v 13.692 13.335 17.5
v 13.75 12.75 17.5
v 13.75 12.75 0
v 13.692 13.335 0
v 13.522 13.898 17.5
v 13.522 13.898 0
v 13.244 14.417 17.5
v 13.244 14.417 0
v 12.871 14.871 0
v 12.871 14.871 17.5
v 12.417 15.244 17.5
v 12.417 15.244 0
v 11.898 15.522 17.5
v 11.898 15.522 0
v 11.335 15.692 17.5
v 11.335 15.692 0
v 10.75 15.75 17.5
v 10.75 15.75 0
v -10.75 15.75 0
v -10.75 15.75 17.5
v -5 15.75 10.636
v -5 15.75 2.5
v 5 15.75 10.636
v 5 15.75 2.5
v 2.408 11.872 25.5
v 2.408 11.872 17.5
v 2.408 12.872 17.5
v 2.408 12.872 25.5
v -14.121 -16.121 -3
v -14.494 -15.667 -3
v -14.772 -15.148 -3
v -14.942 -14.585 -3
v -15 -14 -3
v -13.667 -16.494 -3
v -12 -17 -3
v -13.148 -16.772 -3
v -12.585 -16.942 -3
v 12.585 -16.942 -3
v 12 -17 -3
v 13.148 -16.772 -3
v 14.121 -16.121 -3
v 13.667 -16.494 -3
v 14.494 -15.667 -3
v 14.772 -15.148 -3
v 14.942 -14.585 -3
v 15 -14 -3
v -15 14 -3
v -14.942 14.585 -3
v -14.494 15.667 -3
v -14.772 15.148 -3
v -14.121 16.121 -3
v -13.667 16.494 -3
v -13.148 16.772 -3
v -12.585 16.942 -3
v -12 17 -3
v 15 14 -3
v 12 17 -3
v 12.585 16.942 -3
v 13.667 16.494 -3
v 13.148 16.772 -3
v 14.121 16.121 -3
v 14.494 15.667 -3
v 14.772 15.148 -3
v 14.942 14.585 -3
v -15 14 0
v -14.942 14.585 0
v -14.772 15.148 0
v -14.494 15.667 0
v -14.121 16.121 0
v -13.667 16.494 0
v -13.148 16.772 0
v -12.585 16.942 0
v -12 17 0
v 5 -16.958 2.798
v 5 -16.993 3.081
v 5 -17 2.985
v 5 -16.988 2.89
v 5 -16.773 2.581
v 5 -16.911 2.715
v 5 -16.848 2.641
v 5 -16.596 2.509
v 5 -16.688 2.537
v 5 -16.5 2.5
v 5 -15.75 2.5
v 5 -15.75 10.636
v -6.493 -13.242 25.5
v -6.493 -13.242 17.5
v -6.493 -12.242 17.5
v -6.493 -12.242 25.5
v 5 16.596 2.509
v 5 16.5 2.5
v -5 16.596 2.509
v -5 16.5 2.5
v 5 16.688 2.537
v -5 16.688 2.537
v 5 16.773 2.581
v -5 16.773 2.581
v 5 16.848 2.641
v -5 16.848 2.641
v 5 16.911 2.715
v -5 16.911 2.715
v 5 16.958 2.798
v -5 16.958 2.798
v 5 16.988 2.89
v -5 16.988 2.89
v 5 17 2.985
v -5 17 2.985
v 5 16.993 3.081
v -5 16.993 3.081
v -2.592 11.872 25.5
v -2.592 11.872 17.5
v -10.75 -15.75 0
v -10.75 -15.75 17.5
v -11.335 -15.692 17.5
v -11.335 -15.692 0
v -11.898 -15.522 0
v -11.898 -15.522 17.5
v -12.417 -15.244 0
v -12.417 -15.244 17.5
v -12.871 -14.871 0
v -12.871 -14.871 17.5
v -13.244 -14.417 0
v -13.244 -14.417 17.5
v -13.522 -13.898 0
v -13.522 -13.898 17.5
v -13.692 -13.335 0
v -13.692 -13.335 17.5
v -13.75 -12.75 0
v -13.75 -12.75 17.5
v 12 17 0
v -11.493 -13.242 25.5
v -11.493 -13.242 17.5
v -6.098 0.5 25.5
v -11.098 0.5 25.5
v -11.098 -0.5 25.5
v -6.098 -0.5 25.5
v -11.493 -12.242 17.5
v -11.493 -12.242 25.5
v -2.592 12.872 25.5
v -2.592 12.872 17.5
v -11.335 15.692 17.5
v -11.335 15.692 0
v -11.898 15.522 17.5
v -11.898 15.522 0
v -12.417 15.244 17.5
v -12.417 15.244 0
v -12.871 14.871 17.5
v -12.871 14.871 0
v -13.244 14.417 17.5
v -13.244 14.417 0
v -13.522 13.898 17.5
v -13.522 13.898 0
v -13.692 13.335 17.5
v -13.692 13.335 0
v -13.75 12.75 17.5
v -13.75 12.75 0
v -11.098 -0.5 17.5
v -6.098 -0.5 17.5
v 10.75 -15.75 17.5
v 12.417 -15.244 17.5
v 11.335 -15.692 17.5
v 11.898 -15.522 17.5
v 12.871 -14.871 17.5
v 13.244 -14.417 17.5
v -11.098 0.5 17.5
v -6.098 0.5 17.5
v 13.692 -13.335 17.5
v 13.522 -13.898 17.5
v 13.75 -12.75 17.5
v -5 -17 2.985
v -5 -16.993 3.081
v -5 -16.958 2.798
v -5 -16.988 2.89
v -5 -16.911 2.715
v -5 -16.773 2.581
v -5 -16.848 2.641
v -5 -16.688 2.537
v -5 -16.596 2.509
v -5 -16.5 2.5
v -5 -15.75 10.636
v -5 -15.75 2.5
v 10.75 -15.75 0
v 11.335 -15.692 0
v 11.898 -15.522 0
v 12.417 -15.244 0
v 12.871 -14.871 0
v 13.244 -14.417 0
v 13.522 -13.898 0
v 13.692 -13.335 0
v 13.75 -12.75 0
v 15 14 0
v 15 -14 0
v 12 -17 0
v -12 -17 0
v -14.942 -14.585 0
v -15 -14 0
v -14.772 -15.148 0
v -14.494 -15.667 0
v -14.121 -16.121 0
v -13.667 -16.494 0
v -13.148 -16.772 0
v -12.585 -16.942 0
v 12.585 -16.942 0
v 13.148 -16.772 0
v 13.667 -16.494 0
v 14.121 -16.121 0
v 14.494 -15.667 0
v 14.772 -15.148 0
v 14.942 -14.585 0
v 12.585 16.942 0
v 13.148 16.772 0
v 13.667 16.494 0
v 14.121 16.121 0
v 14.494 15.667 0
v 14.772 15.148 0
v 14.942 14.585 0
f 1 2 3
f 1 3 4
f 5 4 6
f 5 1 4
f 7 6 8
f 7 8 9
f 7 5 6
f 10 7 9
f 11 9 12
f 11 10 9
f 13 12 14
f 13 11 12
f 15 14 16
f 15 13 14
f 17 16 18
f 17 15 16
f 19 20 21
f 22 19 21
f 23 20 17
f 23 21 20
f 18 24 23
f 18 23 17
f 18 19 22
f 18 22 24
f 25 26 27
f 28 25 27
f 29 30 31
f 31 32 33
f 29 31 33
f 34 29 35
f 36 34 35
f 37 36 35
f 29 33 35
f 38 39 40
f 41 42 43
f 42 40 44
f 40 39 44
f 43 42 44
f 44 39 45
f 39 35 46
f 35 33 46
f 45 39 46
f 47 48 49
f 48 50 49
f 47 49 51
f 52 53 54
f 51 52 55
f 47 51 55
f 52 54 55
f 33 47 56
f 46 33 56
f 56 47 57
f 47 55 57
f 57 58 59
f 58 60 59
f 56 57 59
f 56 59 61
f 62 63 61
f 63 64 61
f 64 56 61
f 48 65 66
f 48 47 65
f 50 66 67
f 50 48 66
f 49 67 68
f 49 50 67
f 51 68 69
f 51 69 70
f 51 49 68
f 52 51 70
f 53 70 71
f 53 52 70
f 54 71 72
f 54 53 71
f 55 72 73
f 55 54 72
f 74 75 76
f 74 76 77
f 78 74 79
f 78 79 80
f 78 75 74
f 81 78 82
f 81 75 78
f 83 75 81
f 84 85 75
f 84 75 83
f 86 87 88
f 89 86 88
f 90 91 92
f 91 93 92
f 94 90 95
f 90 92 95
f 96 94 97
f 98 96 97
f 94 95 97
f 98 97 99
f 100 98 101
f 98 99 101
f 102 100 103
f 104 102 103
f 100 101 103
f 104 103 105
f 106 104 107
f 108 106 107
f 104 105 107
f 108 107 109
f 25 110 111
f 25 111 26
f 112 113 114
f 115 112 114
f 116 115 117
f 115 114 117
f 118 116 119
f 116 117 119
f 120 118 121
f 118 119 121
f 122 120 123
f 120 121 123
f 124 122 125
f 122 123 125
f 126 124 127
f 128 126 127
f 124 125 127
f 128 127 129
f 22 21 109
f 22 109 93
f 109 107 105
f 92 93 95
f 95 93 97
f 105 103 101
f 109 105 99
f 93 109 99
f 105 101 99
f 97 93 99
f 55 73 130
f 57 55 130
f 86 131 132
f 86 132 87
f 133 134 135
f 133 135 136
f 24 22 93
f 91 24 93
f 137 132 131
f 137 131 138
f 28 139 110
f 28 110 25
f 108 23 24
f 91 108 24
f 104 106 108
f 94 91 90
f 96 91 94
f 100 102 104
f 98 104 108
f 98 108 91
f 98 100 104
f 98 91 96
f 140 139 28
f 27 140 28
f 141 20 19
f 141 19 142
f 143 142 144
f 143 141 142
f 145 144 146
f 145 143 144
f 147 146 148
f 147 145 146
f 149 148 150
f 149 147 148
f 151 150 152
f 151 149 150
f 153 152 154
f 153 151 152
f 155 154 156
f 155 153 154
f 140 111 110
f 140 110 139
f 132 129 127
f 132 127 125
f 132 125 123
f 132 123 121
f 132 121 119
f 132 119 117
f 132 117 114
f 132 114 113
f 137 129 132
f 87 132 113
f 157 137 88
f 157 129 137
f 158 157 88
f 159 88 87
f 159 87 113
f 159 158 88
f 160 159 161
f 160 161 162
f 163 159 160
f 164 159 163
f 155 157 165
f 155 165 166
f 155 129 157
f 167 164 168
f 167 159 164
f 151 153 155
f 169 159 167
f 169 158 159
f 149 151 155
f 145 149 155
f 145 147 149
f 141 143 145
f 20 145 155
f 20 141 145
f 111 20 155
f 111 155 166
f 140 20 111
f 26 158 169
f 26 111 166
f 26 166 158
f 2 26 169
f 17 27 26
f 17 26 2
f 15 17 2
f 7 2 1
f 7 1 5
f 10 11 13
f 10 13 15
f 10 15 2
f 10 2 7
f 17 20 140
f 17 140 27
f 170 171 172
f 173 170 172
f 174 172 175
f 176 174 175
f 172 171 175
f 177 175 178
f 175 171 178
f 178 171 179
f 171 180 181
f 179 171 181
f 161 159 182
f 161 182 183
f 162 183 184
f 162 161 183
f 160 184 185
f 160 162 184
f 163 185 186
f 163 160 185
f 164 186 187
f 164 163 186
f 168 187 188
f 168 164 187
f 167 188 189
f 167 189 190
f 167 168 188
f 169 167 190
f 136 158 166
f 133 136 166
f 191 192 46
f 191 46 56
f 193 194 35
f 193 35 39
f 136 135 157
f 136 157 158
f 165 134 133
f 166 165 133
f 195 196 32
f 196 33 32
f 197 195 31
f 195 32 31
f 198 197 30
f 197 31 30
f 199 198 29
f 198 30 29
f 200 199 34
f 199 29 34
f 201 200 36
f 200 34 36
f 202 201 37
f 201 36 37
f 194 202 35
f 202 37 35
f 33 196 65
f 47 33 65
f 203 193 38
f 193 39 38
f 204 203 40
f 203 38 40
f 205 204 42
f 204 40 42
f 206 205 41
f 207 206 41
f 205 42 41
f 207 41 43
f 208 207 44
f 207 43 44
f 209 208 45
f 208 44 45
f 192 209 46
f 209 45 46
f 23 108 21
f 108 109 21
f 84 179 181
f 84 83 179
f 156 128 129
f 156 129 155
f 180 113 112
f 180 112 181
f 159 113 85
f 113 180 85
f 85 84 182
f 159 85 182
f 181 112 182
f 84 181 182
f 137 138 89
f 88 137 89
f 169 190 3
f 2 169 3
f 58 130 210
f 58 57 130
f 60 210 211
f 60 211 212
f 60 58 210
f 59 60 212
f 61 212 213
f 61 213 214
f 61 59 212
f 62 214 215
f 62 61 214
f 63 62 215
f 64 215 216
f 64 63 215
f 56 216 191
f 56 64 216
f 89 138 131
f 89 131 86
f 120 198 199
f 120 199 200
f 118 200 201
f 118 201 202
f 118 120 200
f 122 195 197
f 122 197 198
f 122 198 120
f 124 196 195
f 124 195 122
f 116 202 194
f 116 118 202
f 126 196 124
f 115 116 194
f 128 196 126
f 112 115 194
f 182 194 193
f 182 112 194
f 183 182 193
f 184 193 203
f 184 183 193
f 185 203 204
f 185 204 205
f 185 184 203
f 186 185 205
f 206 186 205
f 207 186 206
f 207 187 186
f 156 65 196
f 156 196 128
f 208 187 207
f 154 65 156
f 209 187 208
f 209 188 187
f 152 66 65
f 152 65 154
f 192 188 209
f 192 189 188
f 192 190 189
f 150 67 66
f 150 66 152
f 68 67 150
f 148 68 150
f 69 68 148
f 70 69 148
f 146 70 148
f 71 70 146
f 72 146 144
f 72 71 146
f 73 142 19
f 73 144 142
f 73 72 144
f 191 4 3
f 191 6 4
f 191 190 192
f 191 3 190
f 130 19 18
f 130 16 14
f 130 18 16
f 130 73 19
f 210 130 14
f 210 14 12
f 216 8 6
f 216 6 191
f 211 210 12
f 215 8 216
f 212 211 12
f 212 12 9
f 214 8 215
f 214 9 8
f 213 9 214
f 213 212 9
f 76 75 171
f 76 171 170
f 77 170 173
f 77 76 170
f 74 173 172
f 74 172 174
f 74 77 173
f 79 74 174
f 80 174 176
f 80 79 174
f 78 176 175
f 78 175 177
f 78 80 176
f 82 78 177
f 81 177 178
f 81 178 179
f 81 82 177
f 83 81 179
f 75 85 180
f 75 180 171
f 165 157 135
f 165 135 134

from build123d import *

# Parameters (mm, degrees)
SKETCH1_W           = 30
SKETCH1_H           = 34
BOSS_EXTRUDE1_DEPTH = 3
SKETCH3_W           = 27.5
SKETCH3_H           = 31.5
BOSS_EXTRUDE2_DEPTH = 25.5
FILLET1_R           = 3
BOSS_EXTRUDE3_DEPTH = 5
SKETCH5_OUTSIDE_W   = 42.712
SKETCH5_OUTSIDE_H   = 46.712
SKETCH5_OUTSIDE_W_2 = 5
SKETCH5_OUTSIDE_H_2 = 1
CUT_EXTRUDE1_DEPTH  = 8


with BuildPart() as part:
    # Sketch1 → Boss-Extrude1 (new body)
    with BuildSketch(Plane.XY):
        Rectangle(SKETCH1_W, SKETCH1_H)
    extrude(amount=-BOSS_EXTRUDE1_DEPTH)

    # Sketch3 → Boss-Extrude2 (add)
    with BuildSketch(Plane.XY):
        Rectangle(SKETCH3_W, SKETCH3_H)
    extrude(amount=BOSS_EXTRUDE2_DEPTH)

    # Fillet1
    fillet1_edges = [part.edges().sort_by_distance(p)[0] for p in [
        (13.75, -15.75, 12.75),
        (13.75, 15.75, 12.75),
        (-13.75, 15.75, 12.75),
        (-13.75, -15.75, 12.75),
        (15, -17, -1.5),
        (-15, -17, -1.5),
        (-15, 17, -1.5),
        (15, 17, -1.5),
    ]]
    fillet(fillet1_edges, radius=FILLET1_R)

    # Sketch4 → Boss-Extrude3 (add, symmetric)
    with BuildSketch(Plane(origin=(0, 0, 0), x_dir=(0, 0, -1), z_dir=(1, 0, 0))):
        with BuildLine():
            Line((-2.5, 15.75), (-2.5, 16.5))
            ThreePointArc((-2.5, 16.5), (-2.676424395, 16.881180834), (-3.081195313, 16.993363275))
            Line((-3.081195313, 16.993363275), (-10.636185348, 15.75))
            Line((-10.636185348, 15.75), (-2.5, 15.75))
        make_face()
        with BuildLine():
            Line((-2.5, -15.75), (-10.636185348, -15.75))
            Line((-10.636185348, -15.75), (-3.081195313, -16.993363275))
            ThreePointArc((-3.081195313, -16.993363275), (-2.676424395, -16.881180834), (-2.5, -16.5))
            Line((-2.5, -16.5), (-2.5, -15.75))
        make_face()
    extrude(amount=BOSS_EXTRUDE3_DEPTH, both=True)

    # Sketch5 outside → Cut-Extrude1 (cut)
    with BuildSketch(Plane.XY.offset(25.5)):
        Rectangle(SKETCH5_OUTSIDE_W, SKETCH5_OUTSIDE_H)
        with Locations((-8.597584861, 0)):
            Rectangle(SKETCH5_OUTSIDE_W_2, SKETCH5_OUTSIDE_H_2, mode=Mode.SUBTRACT)
        with Locations((-0.092121408, 12.371641233)):
            Rectangle(SKETCH5_OUTSIDE_W_2, SKETCH5_OUTSIDE_H_2, mode=Mode.SUBTRACT)
        with Locations((-8.993187032, -12.741906988)):
            Rectangle(SKETCH5_OUTSIDE_W_2, SKETCH5_OUTSIDE_H_2, mode=Mode.SUBTRACT)
    extrude(amount=-CUT_EXTRUDE1_DEPTH, mode=Mode.SUBTRACT)


solid = part.part
